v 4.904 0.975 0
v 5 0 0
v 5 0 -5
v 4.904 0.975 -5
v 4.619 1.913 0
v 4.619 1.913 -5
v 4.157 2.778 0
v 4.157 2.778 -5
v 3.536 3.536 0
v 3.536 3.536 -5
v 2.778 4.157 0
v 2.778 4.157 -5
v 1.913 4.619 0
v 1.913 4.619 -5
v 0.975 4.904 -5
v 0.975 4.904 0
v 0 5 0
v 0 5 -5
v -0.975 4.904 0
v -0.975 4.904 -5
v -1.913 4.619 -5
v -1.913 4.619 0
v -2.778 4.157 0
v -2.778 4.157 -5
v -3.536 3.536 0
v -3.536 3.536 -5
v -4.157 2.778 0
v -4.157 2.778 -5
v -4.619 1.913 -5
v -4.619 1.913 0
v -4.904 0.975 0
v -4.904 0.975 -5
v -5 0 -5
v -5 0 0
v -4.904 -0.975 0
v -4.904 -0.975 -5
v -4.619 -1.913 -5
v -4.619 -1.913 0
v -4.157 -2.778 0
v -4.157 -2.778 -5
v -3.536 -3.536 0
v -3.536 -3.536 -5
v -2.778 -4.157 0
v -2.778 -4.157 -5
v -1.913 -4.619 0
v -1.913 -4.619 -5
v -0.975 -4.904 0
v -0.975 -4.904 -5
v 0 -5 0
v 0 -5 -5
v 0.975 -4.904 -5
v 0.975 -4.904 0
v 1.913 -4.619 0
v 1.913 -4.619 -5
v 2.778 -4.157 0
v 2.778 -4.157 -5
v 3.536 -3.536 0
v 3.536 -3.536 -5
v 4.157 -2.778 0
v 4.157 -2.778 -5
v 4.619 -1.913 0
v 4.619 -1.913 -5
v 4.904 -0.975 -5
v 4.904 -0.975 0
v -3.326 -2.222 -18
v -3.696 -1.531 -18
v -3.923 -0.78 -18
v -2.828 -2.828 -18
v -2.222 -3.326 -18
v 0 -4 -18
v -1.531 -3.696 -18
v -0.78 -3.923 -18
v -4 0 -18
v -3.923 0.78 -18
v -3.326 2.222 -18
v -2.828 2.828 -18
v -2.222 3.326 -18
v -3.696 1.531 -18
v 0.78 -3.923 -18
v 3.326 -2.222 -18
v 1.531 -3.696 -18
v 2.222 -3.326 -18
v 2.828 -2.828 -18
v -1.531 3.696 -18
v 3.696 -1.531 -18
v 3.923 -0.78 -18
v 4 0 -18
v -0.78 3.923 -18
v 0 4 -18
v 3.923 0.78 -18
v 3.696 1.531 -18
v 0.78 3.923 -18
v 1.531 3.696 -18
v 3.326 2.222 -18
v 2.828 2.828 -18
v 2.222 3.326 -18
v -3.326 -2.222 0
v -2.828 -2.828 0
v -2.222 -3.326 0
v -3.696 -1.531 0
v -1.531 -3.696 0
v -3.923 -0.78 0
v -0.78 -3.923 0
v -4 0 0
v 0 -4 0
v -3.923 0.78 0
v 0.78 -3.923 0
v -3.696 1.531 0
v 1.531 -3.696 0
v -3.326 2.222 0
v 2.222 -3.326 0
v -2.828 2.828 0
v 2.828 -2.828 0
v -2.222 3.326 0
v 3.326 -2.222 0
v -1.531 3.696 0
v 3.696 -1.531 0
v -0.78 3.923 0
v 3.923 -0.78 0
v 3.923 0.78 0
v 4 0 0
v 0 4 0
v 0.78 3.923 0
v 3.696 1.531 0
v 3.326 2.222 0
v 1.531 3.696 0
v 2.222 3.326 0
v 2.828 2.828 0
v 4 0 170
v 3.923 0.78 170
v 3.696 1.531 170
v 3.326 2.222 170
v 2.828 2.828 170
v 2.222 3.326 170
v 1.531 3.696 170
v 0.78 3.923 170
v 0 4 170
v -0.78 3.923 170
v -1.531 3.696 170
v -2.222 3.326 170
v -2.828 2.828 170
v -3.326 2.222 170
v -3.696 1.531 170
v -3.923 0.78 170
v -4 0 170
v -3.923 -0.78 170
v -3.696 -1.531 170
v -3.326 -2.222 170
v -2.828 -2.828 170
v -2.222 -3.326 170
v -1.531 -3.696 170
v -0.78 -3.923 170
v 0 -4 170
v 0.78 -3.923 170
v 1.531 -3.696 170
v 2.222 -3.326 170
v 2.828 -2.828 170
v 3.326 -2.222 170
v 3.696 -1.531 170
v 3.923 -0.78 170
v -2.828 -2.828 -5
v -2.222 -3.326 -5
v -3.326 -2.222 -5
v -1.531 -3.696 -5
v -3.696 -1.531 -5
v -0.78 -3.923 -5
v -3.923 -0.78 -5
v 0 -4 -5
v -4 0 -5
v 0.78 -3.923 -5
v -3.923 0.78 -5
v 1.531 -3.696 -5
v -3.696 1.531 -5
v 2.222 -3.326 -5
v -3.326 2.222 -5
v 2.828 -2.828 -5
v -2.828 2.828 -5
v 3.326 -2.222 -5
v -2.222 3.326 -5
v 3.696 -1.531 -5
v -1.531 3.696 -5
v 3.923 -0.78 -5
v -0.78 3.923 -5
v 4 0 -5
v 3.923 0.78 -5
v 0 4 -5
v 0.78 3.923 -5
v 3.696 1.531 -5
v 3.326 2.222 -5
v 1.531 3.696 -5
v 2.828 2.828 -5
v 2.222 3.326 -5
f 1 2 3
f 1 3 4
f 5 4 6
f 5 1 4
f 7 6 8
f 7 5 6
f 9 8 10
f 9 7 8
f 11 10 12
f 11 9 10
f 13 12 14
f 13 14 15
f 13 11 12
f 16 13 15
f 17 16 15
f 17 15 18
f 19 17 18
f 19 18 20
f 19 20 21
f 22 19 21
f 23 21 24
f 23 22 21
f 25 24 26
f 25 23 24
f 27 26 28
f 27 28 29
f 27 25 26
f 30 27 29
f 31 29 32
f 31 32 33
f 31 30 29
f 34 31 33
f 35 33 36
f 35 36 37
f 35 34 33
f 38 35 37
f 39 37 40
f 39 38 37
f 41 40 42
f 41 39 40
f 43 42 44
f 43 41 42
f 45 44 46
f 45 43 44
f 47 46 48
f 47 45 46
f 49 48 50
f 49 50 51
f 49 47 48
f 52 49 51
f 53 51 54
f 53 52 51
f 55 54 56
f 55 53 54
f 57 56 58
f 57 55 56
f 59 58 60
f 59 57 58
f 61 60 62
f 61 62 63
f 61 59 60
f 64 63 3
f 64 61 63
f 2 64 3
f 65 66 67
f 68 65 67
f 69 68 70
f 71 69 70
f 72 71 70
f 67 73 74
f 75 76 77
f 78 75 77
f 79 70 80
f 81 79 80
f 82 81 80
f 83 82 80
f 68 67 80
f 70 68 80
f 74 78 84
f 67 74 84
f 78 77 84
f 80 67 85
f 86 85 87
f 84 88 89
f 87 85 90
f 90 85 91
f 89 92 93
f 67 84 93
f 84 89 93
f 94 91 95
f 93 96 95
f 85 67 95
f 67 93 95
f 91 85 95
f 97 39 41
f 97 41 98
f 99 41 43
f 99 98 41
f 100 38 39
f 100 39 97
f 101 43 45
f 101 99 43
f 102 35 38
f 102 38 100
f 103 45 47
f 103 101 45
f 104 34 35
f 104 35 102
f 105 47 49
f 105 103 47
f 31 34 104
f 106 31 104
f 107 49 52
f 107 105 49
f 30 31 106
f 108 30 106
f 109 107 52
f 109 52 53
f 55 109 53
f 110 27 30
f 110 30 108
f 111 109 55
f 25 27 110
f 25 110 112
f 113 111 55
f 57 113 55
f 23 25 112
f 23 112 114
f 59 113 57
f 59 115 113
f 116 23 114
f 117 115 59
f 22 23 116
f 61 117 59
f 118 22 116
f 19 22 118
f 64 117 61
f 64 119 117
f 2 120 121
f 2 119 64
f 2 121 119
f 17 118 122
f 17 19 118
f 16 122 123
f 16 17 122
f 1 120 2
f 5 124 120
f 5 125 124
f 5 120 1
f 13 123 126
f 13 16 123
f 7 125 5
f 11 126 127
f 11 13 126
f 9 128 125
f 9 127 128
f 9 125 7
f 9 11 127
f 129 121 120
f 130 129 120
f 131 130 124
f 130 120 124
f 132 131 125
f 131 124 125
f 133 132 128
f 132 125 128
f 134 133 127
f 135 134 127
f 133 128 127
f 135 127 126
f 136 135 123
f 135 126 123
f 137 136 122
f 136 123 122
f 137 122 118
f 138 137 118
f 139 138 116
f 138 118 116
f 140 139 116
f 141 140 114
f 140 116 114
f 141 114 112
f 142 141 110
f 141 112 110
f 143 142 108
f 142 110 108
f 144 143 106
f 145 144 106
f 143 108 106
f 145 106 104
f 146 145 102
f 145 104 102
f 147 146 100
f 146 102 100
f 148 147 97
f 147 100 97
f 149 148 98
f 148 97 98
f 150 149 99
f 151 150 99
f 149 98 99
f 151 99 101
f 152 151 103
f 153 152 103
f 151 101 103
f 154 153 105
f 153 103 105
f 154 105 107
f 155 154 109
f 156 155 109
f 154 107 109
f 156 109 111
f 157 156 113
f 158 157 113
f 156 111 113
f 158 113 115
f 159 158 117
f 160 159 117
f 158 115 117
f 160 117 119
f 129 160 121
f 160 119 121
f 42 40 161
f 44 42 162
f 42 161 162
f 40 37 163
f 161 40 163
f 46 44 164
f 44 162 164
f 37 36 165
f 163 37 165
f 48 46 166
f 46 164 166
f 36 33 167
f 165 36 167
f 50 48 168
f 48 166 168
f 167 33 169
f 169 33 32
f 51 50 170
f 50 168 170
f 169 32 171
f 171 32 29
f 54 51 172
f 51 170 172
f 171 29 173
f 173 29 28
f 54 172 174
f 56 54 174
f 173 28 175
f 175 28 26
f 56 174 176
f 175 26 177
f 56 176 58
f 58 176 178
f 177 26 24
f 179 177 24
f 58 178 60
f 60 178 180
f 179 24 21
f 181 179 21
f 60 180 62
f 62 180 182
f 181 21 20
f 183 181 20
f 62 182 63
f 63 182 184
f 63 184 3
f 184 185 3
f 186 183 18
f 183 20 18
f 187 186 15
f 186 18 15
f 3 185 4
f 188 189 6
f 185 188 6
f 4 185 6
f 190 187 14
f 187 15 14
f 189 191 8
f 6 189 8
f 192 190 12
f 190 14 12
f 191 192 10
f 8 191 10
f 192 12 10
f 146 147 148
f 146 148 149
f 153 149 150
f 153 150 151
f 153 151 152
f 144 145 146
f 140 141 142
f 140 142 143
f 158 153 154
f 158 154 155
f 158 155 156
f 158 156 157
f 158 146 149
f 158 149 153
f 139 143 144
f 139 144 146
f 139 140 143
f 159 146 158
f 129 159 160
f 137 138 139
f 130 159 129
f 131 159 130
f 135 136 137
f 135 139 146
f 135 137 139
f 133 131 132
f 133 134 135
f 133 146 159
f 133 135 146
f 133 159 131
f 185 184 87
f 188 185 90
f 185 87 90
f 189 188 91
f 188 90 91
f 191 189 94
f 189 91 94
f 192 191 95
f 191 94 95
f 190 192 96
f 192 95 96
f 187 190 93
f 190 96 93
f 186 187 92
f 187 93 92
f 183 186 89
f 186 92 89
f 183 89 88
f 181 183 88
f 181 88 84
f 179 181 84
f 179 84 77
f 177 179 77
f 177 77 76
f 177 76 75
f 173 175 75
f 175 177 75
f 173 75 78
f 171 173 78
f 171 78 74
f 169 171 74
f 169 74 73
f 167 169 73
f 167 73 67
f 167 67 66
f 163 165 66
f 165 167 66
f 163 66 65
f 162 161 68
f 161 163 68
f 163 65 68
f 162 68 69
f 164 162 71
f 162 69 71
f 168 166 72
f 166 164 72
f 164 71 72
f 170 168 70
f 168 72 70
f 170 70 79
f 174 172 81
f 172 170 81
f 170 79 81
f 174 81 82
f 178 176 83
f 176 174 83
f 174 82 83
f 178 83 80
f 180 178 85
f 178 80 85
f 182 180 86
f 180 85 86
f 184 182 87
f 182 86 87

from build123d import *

# Parameters (mm, degrees)
SKETCH1_R           = 4
BOSS_EXTRUDE1_DEPTH = 170
SKETCH2_R           = 5
BOSS_EXTRUDE2_DEPTH = 5
BOSS_EXTRUDE3_START = -18
SKETCH3_R           = 4
BOSS_EXTRUDE3_DEPTH = 18


with BuildPart() as part:
    # Sketch1 → Boss-Extrude1 (new body)
    with BuildSketch(Plane.XY):
        Circle(SKETCH1_R)
    extrude(amount=BOSS_EXTRUDE1_DEPTH)

    # Sketch2 → Boss-Extrude2 (add)
    with BuildSketch(Plane.XY):
        Circle(SKETCH2_R)
    extrude(amount=-BOSS_EXTRUDE2_DEPTH)

    # Sketch3 → Boss-Extrude3 (add)
    with BuildSketch(Plane.XY.offset(BOSS_EXTRUDE3_START)):
        Circle(SKETCH3_R)
    extrude(amount=BOSS_EXTRUDE3_DEPTH)


solid = part.part
